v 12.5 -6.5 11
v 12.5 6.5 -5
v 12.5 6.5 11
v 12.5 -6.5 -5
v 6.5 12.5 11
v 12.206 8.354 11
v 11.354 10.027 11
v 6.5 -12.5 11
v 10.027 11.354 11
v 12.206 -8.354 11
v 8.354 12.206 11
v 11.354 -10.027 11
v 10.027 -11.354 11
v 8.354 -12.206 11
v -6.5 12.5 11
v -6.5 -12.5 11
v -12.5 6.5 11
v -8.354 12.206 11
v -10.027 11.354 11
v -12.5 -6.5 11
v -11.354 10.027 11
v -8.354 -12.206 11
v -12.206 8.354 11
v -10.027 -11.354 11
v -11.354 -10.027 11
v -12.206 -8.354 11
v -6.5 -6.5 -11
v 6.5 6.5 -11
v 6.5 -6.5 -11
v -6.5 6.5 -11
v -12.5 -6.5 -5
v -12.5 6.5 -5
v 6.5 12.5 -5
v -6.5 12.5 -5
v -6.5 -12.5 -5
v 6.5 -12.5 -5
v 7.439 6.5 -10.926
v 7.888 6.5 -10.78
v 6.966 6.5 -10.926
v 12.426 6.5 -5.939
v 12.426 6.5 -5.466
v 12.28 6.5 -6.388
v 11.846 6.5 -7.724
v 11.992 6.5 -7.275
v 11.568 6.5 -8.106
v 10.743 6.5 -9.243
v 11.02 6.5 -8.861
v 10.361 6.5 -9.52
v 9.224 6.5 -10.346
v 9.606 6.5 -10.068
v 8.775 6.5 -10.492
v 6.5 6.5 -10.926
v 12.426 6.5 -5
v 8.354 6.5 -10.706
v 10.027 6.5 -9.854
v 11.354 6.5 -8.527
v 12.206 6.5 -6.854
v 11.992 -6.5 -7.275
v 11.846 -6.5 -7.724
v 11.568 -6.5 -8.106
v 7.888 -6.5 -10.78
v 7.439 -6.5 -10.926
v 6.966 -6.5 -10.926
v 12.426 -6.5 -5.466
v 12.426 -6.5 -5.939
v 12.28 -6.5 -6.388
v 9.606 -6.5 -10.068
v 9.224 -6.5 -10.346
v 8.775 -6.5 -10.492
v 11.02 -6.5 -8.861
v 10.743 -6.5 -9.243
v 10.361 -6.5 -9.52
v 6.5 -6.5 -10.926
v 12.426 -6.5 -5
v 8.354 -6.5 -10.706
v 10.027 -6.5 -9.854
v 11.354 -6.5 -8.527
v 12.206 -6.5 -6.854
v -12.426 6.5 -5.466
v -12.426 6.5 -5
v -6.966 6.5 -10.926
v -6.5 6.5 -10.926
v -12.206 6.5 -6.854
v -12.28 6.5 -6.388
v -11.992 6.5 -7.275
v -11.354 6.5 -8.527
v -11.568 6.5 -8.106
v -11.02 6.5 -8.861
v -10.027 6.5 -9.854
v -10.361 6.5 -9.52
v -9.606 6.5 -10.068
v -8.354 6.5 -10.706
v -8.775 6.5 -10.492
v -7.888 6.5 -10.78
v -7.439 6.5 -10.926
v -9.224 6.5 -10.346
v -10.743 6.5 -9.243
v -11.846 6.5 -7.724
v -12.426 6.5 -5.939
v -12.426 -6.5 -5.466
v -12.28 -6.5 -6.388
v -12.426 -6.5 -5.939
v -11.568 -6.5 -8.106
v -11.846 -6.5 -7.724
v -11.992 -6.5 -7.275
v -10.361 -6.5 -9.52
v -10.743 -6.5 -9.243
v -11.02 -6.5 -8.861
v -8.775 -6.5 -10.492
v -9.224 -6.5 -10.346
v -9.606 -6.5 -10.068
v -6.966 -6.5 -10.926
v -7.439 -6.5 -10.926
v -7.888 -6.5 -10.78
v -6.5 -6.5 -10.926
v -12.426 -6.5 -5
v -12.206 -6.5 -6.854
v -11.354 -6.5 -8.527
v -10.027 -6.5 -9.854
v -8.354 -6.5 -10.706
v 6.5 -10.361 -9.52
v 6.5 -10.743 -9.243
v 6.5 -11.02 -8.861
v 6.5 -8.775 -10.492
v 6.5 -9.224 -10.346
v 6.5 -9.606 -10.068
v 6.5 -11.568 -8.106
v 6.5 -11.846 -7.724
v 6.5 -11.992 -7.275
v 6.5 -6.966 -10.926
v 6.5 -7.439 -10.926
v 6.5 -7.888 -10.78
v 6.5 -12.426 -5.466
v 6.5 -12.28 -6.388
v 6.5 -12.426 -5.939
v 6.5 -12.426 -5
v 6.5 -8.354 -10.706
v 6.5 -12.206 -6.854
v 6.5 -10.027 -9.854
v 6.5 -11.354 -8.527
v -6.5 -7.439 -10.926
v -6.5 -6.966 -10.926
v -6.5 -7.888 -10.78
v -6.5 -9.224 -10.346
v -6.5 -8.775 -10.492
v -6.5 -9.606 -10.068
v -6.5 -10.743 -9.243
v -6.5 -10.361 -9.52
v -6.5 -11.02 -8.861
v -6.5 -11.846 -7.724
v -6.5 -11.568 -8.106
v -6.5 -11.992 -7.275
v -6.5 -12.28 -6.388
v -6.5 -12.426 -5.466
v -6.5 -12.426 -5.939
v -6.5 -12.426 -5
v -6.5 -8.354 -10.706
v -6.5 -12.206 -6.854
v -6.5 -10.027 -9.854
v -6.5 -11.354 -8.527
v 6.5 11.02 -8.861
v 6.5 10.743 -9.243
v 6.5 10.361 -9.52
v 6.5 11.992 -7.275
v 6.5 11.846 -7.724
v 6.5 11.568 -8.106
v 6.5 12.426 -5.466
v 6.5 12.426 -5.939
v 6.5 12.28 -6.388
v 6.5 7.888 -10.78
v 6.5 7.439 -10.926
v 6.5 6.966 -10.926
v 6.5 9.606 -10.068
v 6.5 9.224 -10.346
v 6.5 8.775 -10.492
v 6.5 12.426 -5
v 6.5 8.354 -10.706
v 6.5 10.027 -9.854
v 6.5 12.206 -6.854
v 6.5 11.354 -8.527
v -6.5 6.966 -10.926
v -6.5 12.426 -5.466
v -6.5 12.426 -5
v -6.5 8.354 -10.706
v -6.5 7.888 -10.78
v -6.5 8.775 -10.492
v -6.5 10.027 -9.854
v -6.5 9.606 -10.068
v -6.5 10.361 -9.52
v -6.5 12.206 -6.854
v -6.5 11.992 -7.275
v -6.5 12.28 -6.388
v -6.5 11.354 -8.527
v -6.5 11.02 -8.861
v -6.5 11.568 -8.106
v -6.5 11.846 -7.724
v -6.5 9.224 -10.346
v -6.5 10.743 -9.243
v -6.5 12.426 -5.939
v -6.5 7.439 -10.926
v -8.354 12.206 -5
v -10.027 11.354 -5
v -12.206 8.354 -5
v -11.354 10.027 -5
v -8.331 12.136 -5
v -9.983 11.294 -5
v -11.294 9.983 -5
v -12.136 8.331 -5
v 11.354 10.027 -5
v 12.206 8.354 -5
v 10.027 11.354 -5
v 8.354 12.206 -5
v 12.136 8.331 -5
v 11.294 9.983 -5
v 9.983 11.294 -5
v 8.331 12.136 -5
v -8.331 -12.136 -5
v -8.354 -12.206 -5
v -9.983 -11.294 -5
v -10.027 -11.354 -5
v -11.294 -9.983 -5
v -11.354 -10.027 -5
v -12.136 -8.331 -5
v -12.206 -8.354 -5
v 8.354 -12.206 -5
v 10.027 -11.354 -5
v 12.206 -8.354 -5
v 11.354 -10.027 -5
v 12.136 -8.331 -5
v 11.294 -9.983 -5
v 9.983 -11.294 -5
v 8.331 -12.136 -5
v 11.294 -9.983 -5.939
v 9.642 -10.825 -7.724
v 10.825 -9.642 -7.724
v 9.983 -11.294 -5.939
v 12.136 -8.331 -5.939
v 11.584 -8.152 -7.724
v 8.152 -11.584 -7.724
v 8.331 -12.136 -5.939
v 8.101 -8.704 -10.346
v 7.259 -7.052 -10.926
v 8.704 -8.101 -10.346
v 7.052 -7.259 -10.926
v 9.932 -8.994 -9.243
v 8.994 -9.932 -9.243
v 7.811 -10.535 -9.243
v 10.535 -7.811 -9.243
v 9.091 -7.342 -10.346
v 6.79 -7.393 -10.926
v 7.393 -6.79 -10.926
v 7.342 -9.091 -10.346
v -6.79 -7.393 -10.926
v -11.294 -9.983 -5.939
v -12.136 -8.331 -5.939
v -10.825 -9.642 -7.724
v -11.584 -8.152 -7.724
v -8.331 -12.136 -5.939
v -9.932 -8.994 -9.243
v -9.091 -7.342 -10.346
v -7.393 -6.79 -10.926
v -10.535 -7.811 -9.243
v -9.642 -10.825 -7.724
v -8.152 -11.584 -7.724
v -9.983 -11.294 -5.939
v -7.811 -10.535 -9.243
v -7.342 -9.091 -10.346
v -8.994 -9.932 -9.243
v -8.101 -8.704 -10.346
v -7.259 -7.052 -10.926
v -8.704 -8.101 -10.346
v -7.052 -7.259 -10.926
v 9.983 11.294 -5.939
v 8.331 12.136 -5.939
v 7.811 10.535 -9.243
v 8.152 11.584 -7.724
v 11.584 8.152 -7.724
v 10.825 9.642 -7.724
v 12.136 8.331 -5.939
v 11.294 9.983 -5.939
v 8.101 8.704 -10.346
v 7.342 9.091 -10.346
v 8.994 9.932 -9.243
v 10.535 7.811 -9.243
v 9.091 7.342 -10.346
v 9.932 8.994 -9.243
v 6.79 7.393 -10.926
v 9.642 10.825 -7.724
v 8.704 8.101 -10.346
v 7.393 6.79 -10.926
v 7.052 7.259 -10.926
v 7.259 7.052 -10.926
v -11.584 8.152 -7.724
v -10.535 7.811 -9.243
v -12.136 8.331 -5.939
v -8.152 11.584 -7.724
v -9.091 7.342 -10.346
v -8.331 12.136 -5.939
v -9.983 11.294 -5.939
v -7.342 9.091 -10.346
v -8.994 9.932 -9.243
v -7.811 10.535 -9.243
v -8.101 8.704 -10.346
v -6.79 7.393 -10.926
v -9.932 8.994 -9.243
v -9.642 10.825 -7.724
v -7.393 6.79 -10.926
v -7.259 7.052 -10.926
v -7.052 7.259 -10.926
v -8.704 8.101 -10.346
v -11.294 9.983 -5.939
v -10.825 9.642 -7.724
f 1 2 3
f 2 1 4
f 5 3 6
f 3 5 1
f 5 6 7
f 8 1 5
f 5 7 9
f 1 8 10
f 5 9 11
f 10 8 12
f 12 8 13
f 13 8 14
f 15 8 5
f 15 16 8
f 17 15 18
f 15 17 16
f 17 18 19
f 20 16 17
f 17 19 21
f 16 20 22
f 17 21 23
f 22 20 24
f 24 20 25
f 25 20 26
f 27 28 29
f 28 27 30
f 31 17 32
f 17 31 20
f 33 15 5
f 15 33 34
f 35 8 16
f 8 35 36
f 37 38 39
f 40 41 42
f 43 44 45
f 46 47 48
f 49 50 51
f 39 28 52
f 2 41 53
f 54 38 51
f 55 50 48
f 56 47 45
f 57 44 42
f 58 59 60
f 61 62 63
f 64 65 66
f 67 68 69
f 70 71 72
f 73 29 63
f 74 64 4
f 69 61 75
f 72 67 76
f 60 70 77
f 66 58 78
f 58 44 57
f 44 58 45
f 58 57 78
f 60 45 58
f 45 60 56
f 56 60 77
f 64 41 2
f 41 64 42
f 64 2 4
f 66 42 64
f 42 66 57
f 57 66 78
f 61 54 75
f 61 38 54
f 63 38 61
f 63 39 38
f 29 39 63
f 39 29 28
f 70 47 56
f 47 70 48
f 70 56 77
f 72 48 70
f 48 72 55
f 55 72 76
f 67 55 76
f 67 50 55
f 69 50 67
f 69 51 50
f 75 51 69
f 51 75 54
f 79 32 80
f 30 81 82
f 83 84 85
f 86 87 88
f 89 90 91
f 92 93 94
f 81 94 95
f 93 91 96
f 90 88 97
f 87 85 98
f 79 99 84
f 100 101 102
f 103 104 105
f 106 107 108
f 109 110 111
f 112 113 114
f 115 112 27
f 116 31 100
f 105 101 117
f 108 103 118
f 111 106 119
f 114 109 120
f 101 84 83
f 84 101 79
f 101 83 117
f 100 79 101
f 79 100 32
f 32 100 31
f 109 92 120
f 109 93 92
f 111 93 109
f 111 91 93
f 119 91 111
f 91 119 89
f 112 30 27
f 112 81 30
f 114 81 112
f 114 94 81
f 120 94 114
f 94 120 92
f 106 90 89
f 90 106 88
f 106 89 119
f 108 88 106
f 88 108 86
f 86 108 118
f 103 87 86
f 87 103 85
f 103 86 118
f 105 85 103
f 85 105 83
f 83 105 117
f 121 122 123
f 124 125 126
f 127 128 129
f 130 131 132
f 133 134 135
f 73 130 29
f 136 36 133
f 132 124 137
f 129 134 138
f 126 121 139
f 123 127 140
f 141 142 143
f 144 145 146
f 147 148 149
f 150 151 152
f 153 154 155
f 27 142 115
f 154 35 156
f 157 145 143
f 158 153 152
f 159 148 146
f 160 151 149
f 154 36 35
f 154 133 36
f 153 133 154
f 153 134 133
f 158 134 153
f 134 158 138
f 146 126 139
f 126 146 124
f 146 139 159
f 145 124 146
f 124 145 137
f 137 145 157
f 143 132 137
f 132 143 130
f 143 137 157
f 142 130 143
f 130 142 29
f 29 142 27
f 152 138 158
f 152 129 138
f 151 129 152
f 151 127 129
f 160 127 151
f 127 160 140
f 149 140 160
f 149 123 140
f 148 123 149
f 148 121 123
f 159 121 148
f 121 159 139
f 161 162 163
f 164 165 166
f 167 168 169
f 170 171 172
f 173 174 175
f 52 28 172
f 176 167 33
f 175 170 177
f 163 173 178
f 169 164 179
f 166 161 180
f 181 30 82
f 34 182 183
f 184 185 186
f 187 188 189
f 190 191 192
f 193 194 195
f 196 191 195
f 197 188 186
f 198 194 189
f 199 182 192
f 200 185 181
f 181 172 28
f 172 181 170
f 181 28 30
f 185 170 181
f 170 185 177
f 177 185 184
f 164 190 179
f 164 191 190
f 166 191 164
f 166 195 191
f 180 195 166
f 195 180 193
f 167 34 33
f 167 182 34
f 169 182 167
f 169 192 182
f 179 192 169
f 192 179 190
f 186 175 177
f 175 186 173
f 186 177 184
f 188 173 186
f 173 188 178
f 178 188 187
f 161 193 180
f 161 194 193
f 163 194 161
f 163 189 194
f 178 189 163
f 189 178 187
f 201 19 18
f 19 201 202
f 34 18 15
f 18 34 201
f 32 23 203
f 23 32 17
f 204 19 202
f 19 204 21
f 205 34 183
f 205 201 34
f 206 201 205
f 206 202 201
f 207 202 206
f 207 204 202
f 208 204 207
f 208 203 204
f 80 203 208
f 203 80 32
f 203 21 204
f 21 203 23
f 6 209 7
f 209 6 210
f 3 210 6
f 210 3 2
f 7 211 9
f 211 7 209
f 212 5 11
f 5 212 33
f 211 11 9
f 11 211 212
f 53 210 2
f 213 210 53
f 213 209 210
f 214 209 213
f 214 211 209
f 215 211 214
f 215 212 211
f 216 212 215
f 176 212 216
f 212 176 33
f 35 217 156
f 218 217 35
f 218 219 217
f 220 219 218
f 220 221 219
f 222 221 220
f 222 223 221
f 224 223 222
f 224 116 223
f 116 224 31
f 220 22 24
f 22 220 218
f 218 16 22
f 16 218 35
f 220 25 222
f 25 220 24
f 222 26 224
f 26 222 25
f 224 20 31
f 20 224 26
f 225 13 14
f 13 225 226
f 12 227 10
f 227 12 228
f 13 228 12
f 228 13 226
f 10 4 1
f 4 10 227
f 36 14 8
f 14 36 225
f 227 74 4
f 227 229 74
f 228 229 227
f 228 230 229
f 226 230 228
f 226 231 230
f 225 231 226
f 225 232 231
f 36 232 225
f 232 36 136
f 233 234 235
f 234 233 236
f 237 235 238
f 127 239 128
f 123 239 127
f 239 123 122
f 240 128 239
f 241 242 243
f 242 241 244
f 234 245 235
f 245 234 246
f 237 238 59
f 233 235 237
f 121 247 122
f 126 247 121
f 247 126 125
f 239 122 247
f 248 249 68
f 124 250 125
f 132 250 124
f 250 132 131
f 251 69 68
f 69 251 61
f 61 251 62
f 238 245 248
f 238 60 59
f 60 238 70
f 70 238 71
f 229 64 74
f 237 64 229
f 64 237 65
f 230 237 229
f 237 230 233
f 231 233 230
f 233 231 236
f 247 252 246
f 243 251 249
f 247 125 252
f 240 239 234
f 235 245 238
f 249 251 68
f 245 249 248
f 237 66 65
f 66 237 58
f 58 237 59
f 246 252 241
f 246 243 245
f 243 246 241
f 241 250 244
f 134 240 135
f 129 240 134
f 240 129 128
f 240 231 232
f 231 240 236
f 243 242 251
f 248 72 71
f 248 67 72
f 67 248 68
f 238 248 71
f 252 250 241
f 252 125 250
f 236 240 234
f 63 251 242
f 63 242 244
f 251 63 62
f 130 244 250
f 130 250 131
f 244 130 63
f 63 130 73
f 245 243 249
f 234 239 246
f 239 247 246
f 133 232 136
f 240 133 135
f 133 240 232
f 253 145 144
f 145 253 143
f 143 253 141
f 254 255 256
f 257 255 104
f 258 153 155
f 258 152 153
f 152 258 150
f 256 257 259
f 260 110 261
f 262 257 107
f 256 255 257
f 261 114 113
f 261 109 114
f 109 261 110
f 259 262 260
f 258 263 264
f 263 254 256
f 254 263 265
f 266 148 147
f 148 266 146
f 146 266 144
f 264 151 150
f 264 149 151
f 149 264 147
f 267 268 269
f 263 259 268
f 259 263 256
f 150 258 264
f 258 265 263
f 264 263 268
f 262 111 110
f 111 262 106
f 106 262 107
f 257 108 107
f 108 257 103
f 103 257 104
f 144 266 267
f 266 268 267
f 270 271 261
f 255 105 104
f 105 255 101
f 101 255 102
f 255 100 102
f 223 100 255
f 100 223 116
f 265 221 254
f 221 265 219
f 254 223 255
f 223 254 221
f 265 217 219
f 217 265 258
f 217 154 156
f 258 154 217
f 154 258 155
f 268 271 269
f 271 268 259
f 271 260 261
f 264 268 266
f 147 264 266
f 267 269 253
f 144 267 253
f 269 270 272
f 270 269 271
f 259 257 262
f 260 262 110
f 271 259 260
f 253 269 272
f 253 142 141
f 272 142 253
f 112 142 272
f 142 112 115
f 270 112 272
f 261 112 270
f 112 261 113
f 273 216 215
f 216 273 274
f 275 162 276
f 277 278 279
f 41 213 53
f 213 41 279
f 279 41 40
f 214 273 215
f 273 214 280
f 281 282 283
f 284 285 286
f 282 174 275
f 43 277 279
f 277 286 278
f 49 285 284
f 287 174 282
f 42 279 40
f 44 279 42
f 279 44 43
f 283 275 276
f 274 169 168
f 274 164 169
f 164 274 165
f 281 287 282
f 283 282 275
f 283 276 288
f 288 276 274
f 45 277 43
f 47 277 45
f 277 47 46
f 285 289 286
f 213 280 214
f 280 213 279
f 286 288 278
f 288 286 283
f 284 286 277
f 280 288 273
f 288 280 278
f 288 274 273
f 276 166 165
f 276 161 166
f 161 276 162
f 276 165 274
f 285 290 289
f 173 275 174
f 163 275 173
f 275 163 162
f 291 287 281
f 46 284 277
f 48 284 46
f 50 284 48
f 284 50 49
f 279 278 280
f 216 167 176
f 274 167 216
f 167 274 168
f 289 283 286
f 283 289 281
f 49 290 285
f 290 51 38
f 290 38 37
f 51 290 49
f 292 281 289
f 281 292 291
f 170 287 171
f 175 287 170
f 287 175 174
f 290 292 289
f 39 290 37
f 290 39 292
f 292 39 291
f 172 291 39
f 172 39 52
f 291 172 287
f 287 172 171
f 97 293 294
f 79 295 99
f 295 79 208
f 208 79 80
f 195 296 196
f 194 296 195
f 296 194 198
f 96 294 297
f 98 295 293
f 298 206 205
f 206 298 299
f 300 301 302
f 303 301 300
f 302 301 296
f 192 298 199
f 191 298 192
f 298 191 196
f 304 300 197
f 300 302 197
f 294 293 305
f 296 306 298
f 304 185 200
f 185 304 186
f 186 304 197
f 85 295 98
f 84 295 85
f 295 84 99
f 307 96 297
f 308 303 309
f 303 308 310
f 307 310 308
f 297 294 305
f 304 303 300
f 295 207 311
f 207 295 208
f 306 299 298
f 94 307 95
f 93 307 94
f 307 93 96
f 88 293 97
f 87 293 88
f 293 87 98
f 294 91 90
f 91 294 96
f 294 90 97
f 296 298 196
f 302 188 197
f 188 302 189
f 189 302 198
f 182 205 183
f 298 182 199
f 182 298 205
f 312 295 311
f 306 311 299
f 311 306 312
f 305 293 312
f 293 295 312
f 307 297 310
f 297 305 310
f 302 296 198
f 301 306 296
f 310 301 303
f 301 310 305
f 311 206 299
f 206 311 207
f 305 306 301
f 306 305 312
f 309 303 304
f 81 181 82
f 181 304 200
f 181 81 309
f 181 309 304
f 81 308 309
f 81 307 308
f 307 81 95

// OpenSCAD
//A simple Box with Rounded Edges
$fn = 20;







// INPUT PARAMETERS:
//box outer length,
//box outer width,
//box outer height,
//fillet radius (must be <= 1/2 the minimum box dimension,

boxLength = 25;
boxWidth = 25;
boxHeight = 22;
filletRadius=6;













//'natural fillet'; fillet radius = wall Thickness

boxInnerL = boxLength-filletRadius*2;
boxInnerW = boxWidth-filletRadius*2;
boxInnerH = boxHeight-filletRadius*2;


OBsize = [boxLength,boxWidth,boxHeight];
//IBsize = [boxInnerL,boxInnerW,boxInnerH];
difference(){
    
    cube(size=OBsize,center=true);
    
    translate([0.5*(boxInnerL),0.5*(boxInnerW),-0.5*(boxInnerH+2*filletRadius)]){cube(size=[filletRadius,filletRadius,boxHeight]);};
    
    translate([-0.5*(boxInnerL)-filletRadius,-0.5*(boxInnerW)-filletRadius,-0.5*(boxInnerH+2*filletRadius)]){cube(size=[filletRadius,filletRadius,boxHeight]);};
    
    translate([-0.5*(boxInnerL)-filletRadius,0.5*(boxInnerW),-0.5*(boxInnerH+2*filletRadius)]){cube(size=[filletRadius,filletRadius,boxHeight]);};    
    
    translate([0.5*(boxInnerL),-0.5*(boxInnerW)-filletRadius,-0.5*(boxInnerH+2*filletRadius)]){cube(size=[filletRadius,filletRadius,boxHeight]);};

    translate([-0.5*boxInnerL-filletRadius,-0.5*(boxInnerW)-filletRadius,-0.5*(boxInnerH+2*filletRadius)]){cube(size=[boxLength,filletRadius,filletRadius]);};

    translate([-0.5*boxInnerL-filletRadius,0.5*(boxInnerW),-0.5*(boxInnerH+2*filletRadius)]){cube(size=[boxLength,filletRadius,filletRadius]);};
    
    translate([-0.5*boxInnerL-filletRadius,-0.5*(boxInnerW)-filletRadius,-0.5*(boxInnerH+2*filletRadius)]){cube(size=[filletRadius,boxWidth,filletRadius]);};
    
    translate([0.5*boxInnerL,-0.5*(boxInnerW)-filletRadius,-0.5*(boxInnerH+2*filletRadius)]){cube(size=[filletRadius,boxWidth,filletRadius]);};
};
intersection(){
    translate([0.5*boxInnerL,-0.5*(boxInnerW),-0.5*(boxInnerH+2*filletRadius)]){cube(size=[filletRadius,boxWidth-filletRadius*2,filletRadius]);};
    
    translate([0.5*boxInnerL,-0.5*(boxInnerW)-filletRadius,-0.5*(boxInnerH)])rotate([-90,0,0]) cylinder(h = boxWidth,r1 = filletRadius,r2 = filletRadius);
};
    
intersection(){
    translate([-0.5*boxInnerL-filletRadius,-0.5*(boxInnerW),-0.5*(boxInnerH+2*filletRadius)]){cube(size=[filletRadius,boxWidth-filletRadius*2,filletRadius]);};
    
    translate([-0.5*boxInnerL,-0.5*(boxInnerW)-filletRadius,-0.5*(boxInnerH)])rotate([-90,0,0]) cylinder(h = boxWidth,r1 = filletRadius,r2 = filletRadius);
};

intersection(){
    translate([-0.5*boxInnerL,-0.5*(boxInnerW)-filletRadius,-0.5*(boxInnerH+2*filletRadius)]){cube(size=[boxLength-2*filletRadius,filletRadius,filletRadius]);};
    
    translate([-0.5*boxInnerL-filletRadius,-0.5*(boxInnerW),-0.5*(boxInnerH)])rotate([0,90,0]) cylinder(h = boxLength,r1 = filletRadius,r2 = filletRadius);
};

intersection(){
    translate([-0.5*boxInnerL,0.5*(boxInnerW),-0.5*(boxInnerH+2*filletRadius)]){cube(size=[boxLength-2*filletRadius,filletRadius,filletRadius]);};
    
    translate([-0.5*boxInnerL-filletRadius,0.5*(boxInnerW),-0.5*(boxInnerH)])rotate([0,90,0]) cylinder(h = boxLength,r1 = filletRadius,r2 = filletRadius);
};

intersection(){
    translate([-0.5*boxInnerL-filletRadius,0.5*(boxInnerW),-0.5*(boxInnerH+2*filletRadius)]){cube(size=[filletRadius,filletRadius,boxHeight]);};
    
    translate([-0.5*boxInnerL,0.5*(boxInnerW),-0.5*(boxInnerH)])cylinder(h = boxHeight,r1 = filletRadius,r2 = filletRadius);
};
intersection(){
    translate([0.5*boxInnerL,0.5*(boxInnerW),-0.5*(boxInnerH+2*filletRadius)]){cube(size=[filletRadius,filletRadius,boxHeight]);};
    
    translate([0.5*boxInnerL,0.5*(boxInnerW),-0.5*(boxInnerH)])cylinder(h = boxHeight,r1 = filletRadius,r2 = filletRadius);
};
intersection(){
    translate([-0.5*boxInnerL-filletRadius,-0.5*(boxInnerW)-filletRadius,-0.5*(boxInnerH+2*filletRadius)]){cube(size=[filletRadius,filletRadius,boxHeight]);};
    
    translate([-0.5*boxInnerL,-0.5*(boxInnerW),-0.5*(boxInnerH)])cylinder(h = boxHeight,r1 = filletRadius,r2 = filletRadius);
};
intersection(){
    translate([0.5*boxInnerL,-0.5*(boxInnerW)-filletRadius,-0.5*(boxInnerH+2*filletRadius)]){cube(size=[filletRadius,filletRadius,boxHeight]);};
    
    translate([0.5*boxInnerL,-0.5*(boxInnerW),-0.5*(boxInnerH)])cylinder(h = boxHeight,r1 = filletRadius,r2 = filletRadius);
};

intersection(){
    translate([0.5*boxInnerL,-0.5*(boxInnerW)-filletRadius,-0.5*(boxInnerH+2*filletRadius)]){cube(size=[filletRadius,filletRadius,boxHeight]);};
    
    translate([0.5*boxInnerL,-0.5*(boxInnerW),-0.5*(boxInnerH)])sphere(r = filletRadius,center = true);
};

intersection(){
    translate([-0.5*boxInnerL-filletRadius,-0.5*(boxInnerW)-filletRadius,-0.5*(boxInnerH+2*filletRadius)]){cube(size=[filletRadius,filletRadius,boxHeight]);};
    
    translate([-0.5*boxInnerL,-0.5*(boxInnerW),-0.5*(boxInnerH)])sphere(r = filletRadius,center = true);
};
intersection(){
    translate([0.5*boxInnerL,0.5*(boxInnerW),-0.5*(boxInnerH+2*filletRadius)]){cube(size=[filletRadius,filletRadius,boxHeight]);};
    
    translate([0.5*boxInnerL,0.5*(boxInnerW),-0.5*(boxInnerH)])sphere(r = filletRadius,center = true);
};

intersection(){
    translate([-0.5*boxInnerL-filletRadius,0.5*(boxInnerW),-0.5*(boxInnerH+2*filletRadius)]){cube(size=[filletRadius,filletRadius,boxHeight]);};
    
    translate([-0.5*boxInnerL,0.5*(boxInnerW),-0.5*(boxInnerH)])sphere(r = filletRadius,center = true);
};
